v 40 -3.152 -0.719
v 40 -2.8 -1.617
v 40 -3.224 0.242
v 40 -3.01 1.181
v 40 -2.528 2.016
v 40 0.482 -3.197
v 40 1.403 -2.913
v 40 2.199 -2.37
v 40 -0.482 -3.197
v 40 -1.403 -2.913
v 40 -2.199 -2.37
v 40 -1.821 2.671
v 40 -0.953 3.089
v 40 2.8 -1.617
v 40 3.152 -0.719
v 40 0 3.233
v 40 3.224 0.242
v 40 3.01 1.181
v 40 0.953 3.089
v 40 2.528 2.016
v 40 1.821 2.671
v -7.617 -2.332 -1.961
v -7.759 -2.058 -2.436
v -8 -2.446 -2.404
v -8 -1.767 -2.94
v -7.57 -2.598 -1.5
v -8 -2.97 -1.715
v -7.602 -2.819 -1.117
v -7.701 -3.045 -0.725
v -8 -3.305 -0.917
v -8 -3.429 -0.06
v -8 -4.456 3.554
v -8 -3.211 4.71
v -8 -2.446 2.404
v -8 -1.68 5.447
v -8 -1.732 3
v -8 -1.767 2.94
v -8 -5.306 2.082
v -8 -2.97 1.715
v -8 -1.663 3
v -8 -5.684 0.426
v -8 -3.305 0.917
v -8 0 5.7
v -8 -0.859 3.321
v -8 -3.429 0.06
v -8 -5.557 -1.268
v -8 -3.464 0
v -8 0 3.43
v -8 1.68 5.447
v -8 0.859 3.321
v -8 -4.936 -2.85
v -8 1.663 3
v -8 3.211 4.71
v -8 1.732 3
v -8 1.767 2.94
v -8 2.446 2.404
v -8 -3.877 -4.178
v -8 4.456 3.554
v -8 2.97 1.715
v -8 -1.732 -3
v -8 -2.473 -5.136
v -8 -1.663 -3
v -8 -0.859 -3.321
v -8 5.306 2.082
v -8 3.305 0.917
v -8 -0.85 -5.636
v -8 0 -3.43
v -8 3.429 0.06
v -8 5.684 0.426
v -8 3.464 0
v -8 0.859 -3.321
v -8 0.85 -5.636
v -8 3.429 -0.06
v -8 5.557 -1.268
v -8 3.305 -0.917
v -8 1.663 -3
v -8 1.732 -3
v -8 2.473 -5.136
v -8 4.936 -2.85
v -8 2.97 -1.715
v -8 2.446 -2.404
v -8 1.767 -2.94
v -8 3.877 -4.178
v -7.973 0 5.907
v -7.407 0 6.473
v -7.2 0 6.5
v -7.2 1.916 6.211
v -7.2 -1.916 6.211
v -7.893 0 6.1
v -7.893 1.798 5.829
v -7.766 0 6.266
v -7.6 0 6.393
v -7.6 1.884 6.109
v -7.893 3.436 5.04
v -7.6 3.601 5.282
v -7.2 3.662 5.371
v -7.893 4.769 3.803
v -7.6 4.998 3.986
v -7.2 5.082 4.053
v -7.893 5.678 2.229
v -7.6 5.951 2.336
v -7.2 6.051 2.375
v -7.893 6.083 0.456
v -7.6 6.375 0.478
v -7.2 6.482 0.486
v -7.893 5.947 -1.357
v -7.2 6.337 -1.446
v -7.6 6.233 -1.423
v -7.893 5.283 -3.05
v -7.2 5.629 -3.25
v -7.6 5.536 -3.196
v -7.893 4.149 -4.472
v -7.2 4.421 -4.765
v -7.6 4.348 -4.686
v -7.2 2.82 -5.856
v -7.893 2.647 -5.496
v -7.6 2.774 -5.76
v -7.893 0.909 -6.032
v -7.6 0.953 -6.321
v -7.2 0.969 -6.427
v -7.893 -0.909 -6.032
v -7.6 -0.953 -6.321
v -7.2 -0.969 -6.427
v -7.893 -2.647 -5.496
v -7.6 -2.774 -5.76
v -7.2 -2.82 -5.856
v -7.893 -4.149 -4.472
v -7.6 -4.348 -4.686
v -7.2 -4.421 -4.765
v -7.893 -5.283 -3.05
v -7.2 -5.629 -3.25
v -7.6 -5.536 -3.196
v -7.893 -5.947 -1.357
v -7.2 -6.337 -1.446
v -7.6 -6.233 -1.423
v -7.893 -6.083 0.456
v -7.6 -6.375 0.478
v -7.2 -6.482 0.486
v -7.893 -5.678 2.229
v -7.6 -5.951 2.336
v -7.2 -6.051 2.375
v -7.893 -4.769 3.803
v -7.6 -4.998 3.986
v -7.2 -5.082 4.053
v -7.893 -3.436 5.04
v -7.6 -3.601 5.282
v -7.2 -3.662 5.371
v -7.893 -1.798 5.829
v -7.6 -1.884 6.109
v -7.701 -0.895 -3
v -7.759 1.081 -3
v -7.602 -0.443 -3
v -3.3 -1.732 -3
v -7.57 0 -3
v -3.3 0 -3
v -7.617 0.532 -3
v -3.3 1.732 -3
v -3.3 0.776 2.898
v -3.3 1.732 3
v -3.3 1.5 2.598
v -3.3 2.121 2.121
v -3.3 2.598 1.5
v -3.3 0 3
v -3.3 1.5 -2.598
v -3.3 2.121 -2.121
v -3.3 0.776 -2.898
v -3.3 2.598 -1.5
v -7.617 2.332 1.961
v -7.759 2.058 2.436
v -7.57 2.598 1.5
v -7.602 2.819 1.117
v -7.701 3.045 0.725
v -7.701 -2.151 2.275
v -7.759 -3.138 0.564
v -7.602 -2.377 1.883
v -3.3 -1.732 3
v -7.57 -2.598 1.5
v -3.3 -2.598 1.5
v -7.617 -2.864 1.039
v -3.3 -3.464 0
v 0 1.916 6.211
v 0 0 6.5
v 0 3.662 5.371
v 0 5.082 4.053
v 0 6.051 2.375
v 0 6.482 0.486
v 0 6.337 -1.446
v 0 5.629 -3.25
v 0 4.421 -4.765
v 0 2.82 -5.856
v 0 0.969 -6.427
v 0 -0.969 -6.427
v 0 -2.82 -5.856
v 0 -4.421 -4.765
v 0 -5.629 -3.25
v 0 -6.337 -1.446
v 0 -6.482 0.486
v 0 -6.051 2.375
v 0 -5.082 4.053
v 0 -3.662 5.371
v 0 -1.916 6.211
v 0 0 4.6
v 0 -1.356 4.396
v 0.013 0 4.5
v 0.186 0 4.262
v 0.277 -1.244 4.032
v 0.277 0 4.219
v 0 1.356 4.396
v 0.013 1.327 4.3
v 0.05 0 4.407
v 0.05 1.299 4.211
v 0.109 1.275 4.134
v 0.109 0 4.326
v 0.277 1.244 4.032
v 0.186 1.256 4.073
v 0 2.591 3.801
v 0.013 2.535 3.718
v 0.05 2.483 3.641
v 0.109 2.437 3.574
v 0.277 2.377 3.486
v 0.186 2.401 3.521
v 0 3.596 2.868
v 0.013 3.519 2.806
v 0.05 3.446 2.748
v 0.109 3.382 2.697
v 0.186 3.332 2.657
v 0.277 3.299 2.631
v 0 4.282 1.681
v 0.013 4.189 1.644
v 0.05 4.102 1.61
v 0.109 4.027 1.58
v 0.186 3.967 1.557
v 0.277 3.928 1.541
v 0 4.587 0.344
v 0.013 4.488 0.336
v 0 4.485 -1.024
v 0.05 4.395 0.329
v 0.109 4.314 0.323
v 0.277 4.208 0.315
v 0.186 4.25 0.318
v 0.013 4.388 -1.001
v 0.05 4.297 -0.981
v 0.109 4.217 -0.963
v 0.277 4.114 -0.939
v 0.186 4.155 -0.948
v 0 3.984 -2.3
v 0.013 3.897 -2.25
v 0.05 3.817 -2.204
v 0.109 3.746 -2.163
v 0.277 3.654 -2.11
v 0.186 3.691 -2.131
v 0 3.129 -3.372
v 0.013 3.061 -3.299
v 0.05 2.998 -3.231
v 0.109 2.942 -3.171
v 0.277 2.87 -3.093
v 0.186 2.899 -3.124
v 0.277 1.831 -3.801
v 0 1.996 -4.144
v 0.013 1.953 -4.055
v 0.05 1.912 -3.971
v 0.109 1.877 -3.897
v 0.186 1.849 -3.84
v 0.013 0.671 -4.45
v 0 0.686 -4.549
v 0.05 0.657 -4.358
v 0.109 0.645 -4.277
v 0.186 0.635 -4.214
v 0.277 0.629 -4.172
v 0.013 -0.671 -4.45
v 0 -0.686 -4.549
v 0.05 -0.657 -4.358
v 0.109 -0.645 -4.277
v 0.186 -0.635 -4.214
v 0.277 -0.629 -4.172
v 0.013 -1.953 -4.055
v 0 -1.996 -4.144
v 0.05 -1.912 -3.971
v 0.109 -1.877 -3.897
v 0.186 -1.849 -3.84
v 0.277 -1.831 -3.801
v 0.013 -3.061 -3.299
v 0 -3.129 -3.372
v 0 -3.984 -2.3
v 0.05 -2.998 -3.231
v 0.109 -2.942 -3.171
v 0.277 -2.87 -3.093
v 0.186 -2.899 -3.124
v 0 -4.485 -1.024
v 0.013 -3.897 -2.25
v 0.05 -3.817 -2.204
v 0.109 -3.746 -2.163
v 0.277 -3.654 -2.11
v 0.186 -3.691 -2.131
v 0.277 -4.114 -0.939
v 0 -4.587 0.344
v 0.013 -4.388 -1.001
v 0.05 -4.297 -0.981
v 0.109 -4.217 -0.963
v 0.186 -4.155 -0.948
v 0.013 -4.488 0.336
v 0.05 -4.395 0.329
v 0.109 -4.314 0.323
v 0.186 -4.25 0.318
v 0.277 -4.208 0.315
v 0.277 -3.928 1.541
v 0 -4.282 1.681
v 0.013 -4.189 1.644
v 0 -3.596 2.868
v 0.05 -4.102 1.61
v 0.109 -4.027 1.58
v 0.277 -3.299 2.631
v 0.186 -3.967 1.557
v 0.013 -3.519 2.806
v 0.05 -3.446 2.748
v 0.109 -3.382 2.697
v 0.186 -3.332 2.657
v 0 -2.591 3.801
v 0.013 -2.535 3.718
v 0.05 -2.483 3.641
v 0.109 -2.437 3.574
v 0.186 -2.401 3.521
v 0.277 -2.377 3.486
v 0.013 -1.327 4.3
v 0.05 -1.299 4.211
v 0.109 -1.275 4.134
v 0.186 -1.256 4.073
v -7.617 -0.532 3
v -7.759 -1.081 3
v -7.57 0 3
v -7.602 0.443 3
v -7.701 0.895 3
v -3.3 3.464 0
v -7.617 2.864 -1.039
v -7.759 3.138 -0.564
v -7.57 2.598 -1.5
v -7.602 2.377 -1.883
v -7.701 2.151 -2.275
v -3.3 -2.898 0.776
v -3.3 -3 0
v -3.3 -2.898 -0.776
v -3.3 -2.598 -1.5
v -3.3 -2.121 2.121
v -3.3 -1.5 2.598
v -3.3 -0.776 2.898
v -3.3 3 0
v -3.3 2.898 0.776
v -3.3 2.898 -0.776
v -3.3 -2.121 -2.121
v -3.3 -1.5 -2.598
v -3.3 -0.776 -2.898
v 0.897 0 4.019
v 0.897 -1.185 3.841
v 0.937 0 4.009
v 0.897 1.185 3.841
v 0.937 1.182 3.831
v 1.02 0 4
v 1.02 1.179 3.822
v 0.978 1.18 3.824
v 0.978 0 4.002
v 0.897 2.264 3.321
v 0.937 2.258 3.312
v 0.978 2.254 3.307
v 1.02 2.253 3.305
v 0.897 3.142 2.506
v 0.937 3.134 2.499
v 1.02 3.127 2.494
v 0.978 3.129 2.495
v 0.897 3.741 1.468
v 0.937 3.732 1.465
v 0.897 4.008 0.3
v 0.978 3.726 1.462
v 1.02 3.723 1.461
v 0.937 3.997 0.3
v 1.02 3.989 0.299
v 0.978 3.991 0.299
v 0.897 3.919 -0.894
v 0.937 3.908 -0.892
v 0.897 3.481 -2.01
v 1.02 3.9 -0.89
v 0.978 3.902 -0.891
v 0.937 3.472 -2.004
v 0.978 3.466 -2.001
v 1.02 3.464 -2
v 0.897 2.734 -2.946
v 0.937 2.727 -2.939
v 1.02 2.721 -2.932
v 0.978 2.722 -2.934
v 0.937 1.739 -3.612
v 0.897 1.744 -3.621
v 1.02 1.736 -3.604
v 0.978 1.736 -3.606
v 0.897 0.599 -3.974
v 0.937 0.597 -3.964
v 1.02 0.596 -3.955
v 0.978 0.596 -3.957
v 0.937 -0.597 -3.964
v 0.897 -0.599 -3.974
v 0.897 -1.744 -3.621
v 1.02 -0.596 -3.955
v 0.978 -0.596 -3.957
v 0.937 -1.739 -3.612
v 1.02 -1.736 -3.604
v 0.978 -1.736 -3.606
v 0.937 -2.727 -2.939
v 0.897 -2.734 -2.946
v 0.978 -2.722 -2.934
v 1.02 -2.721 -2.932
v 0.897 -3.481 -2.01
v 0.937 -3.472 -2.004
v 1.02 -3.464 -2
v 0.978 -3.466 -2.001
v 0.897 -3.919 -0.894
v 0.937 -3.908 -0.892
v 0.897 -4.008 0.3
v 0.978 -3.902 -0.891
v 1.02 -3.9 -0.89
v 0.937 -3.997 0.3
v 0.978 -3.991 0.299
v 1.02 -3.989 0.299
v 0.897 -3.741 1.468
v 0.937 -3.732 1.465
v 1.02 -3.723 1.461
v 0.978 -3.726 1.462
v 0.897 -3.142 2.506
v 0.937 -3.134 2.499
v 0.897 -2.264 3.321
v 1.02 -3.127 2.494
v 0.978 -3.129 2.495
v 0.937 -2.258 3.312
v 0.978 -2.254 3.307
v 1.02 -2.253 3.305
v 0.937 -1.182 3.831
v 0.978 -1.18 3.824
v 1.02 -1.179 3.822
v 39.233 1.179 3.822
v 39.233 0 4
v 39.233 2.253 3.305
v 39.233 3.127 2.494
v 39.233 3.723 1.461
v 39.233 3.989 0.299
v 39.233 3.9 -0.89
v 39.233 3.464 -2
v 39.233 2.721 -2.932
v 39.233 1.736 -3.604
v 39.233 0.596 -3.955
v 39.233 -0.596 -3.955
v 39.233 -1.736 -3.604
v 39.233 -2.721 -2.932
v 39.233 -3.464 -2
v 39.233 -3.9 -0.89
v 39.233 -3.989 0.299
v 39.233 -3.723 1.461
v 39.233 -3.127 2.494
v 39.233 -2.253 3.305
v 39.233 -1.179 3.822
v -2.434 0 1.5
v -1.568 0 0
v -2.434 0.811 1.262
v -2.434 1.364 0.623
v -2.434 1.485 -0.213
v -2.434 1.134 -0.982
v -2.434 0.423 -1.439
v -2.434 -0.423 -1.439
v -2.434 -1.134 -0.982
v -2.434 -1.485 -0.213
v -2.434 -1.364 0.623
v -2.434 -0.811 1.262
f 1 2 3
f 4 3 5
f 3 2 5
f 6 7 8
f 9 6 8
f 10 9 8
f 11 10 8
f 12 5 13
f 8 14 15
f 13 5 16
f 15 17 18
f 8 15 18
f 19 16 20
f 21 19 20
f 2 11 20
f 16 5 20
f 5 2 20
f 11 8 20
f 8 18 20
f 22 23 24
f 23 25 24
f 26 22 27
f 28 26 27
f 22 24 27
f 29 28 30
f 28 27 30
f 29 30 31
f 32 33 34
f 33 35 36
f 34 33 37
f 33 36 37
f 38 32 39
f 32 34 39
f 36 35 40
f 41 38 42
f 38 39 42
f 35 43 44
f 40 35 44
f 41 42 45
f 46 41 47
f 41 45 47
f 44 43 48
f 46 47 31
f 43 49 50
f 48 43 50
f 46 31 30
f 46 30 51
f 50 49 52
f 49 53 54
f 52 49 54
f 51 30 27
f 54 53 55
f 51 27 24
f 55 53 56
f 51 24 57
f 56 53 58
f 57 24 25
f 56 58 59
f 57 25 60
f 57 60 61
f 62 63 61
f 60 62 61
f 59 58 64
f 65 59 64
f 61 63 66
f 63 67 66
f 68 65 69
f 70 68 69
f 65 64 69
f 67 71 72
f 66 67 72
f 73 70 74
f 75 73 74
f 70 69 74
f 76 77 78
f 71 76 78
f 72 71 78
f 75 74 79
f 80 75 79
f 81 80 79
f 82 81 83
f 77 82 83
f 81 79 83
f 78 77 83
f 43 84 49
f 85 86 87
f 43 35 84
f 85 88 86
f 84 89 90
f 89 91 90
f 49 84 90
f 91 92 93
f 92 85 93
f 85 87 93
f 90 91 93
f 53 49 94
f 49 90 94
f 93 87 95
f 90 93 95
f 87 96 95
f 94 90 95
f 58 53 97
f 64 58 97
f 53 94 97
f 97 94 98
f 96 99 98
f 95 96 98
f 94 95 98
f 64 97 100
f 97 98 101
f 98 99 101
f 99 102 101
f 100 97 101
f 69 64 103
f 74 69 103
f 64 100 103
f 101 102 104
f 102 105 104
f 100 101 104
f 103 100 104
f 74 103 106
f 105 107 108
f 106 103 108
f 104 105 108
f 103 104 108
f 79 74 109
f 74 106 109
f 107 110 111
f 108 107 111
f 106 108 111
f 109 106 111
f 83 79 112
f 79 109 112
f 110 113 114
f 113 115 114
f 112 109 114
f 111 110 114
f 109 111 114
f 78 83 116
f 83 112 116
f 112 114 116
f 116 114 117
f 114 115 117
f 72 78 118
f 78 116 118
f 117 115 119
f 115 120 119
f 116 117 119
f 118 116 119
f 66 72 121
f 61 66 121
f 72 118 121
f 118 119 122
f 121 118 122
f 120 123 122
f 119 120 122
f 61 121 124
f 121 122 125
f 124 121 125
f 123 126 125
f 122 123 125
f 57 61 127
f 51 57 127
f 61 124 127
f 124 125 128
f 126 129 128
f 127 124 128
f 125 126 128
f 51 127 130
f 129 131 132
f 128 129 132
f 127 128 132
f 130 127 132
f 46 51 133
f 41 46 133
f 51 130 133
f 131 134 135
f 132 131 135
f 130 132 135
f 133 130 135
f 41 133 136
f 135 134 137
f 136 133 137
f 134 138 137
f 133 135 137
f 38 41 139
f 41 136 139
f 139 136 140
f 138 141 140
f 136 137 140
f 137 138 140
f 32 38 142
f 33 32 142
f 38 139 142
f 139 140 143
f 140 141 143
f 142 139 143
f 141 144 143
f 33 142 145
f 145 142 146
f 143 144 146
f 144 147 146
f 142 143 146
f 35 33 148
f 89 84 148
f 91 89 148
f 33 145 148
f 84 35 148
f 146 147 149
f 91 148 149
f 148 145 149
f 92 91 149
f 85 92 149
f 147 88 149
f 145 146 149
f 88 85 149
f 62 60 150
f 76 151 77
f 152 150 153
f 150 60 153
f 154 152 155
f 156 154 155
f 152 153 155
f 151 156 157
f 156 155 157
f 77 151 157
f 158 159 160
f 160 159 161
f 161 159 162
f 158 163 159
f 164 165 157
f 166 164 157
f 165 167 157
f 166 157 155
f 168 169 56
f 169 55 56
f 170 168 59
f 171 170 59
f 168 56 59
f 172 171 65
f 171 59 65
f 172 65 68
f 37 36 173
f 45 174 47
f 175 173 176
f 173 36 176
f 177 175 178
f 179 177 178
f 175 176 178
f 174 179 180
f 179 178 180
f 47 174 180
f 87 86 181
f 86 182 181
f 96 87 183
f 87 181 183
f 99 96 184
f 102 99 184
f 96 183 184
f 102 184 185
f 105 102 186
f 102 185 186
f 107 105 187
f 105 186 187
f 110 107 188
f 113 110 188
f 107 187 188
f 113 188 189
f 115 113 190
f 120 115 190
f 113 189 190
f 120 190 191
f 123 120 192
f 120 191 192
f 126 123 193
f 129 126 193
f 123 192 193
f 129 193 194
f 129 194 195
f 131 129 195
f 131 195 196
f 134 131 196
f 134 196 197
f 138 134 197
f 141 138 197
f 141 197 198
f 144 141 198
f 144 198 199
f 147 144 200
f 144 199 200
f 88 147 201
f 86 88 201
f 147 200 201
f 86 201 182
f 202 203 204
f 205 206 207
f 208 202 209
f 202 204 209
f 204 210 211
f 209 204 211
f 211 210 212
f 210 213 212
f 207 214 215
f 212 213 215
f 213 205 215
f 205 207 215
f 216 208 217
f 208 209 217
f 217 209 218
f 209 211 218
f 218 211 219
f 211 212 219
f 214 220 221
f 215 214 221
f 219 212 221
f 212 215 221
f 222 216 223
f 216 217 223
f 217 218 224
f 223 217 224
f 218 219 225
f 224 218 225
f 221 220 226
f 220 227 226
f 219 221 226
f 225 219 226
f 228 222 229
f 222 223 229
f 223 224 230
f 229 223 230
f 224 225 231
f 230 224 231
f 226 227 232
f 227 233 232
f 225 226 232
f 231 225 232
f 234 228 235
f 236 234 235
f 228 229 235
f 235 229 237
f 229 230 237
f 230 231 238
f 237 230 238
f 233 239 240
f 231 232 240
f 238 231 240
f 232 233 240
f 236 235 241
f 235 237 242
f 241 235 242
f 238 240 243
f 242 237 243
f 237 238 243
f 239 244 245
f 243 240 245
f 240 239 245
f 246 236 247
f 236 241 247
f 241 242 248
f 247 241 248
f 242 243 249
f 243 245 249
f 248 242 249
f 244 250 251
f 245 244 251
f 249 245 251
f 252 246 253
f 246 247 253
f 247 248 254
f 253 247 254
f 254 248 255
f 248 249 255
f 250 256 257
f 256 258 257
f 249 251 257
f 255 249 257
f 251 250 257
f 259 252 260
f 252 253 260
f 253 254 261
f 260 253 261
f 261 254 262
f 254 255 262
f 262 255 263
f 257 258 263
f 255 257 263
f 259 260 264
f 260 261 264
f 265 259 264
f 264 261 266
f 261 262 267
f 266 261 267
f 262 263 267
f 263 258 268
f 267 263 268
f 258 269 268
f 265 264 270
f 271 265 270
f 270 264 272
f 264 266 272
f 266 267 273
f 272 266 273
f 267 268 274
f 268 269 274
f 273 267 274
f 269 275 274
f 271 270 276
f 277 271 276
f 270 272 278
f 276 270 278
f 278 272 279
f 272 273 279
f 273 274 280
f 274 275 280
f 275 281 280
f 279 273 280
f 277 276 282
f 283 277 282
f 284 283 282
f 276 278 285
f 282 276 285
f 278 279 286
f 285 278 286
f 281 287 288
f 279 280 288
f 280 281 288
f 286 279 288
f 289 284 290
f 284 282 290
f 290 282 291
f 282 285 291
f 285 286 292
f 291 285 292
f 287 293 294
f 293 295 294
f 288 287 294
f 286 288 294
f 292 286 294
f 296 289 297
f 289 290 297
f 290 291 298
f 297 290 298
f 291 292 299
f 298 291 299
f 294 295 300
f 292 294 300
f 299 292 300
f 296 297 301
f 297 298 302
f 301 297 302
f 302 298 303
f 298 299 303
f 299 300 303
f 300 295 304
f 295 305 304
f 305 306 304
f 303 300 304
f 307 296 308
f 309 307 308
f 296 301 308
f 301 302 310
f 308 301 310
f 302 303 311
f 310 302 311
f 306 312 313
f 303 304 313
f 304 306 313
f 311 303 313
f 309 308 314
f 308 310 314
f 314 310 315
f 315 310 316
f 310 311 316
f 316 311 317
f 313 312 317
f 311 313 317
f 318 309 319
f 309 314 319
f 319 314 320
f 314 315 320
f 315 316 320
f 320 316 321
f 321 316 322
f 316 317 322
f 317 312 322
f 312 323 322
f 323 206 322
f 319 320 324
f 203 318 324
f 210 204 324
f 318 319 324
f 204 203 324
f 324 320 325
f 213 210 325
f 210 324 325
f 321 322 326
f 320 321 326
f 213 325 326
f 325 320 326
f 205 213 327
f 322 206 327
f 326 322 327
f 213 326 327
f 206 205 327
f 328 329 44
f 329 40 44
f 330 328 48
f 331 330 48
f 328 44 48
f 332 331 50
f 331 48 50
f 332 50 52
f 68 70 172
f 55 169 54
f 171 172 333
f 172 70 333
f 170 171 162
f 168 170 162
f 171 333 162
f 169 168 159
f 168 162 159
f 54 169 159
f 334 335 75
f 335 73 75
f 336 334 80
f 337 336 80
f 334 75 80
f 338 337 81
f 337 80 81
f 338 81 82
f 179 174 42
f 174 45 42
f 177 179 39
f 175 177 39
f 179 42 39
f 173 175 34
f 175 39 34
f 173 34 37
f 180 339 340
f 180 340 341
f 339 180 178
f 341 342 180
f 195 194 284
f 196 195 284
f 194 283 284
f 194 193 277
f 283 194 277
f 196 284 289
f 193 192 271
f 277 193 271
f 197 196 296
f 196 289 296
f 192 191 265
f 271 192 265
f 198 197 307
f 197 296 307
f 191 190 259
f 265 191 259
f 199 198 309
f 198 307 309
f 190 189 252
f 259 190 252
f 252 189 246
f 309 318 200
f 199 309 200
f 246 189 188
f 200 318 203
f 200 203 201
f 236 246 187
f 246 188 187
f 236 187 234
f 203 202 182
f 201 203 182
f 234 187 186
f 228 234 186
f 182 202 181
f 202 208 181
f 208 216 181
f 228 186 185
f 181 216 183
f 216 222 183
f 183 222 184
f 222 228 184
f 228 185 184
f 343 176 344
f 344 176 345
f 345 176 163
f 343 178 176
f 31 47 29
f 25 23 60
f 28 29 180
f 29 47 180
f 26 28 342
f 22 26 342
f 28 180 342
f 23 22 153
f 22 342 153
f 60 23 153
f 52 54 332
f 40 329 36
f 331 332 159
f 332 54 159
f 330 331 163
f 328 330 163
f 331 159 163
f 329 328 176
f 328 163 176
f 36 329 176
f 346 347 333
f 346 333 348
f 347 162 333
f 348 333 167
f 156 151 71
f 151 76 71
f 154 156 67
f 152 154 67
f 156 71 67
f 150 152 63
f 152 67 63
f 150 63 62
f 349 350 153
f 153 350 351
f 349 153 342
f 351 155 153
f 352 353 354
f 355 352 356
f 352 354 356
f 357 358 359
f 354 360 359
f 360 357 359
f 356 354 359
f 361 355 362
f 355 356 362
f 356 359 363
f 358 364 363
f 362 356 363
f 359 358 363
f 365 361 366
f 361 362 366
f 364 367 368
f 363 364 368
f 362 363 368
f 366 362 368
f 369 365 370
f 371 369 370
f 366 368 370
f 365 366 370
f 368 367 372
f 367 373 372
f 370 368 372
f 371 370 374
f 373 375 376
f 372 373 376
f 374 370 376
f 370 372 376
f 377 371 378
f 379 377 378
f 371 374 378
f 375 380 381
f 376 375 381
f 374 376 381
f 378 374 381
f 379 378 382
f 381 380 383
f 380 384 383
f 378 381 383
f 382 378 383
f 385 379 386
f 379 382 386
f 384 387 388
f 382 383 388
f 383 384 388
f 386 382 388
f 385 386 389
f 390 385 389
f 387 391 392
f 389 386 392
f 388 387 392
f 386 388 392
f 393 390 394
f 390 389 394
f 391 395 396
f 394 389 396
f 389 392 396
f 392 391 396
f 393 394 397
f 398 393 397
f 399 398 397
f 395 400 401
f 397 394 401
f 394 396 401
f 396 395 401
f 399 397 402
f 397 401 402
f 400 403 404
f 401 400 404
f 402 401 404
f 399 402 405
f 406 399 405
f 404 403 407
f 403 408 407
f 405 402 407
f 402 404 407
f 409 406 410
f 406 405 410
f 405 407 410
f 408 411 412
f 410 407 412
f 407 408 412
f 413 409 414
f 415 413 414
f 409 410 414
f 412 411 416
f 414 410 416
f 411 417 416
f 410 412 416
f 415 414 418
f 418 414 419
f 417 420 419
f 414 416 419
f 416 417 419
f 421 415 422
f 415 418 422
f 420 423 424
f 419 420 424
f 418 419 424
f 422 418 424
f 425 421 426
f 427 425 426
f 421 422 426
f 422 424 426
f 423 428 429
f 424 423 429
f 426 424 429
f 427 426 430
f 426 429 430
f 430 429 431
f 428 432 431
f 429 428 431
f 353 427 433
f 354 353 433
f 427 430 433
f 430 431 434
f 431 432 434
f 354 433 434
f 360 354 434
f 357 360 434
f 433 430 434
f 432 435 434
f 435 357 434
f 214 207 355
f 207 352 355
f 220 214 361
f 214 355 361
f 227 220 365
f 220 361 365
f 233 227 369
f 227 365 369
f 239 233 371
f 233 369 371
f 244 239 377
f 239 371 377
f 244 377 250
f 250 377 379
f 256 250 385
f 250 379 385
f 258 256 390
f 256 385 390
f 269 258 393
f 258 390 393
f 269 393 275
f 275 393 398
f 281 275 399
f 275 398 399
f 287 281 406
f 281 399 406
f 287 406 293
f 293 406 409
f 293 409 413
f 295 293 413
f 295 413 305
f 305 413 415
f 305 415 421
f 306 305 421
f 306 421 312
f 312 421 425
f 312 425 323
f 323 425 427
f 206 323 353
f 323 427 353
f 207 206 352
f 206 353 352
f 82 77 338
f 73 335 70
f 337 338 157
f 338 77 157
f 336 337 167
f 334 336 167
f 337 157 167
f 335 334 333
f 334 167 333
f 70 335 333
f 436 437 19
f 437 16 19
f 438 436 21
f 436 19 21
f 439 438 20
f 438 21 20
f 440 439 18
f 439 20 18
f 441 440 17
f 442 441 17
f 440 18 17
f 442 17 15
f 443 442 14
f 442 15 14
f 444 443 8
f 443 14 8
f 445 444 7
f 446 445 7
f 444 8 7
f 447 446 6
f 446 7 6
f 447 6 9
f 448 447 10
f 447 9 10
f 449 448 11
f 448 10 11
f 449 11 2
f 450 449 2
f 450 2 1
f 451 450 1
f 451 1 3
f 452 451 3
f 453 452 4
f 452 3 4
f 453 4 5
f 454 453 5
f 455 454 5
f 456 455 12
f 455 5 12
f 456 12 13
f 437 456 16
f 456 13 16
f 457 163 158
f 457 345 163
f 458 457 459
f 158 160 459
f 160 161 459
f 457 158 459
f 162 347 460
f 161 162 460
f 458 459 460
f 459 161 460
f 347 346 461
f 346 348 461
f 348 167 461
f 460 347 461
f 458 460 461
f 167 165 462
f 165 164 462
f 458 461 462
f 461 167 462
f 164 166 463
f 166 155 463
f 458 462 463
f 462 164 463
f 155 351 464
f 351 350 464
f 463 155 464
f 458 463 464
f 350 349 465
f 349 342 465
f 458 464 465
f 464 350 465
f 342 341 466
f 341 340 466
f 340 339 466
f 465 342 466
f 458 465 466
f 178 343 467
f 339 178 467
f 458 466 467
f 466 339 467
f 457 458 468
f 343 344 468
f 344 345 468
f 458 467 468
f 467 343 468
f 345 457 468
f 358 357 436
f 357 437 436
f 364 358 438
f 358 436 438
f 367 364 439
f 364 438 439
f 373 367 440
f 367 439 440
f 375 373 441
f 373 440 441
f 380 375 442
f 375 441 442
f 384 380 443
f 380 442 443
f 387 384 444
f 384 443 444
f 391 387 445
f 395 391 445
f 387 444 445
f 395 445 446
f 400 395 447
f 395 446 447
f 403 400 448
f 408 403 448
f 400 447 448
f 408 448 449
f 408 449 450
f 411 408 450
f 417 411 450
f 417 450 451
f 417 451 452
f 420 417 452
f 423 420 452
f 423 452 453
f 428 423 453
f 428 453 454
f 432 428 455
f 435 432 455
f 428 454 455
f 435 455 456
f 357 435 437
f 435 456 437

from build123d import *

# Parameters (mm, degrees)
ENL_V_MAT_EXTRU_1_DEPTH = 8
ESQUISSE3_R             = 4.875
BOSS_EXTRU_1_DEPTH      = 4.161898962


with BuildPart() as part:
    # Esquisse1 → Révolution1 (revolve)
    with BuildSketch(Plane(origin=(0, 0, 0), x_dir=(1, 0, 0), z_dir=(0, 1, 0)), mode=Mode.PRIVATE) as r_volution1_sk:
        with BuildLine():
            Line((-1.567949192, 0), (-3.3, 3))
            Line((-3.3, 3), (-7.57, 3))
            Line((-7.57, 3), (-8, 3.43))
            Line((-8, 3.43), (-8, 5.7))
            ThreePointArc((-8, 5.7), (-7.765685425, 6.265685425), (-7.2, 6.5))
            Line((-7.2, 6.5), (0, 6.5))
            Line((0, 6.5), (0, 4.6))
            ThreePointArc((0, 4.6), (0.076642269, 4.36454347), (0.277198888, 4.219316553))
            Line((0.277198888, 4.219316553), (0.897198888, 4.019316553))
            ThreePointArc((0.897198888, 4.019316553), (0.957844465, 4.004858646), (1.02, 4))
            Line((1.02, 4), (39.233, 4))
            Line((39.233, 4), (40, 3.233))
            Line((40, 3.233), (40, 0))
            Line((40, 0), (-1.567949192, 0))
        make_face()
    revolve(r_volution1_sk.sketch.rotate(Axis((43, 0, 0), (-1, 0, 0)), 180), axis=Axis((43, 0, 0), (-1, 0, 0)))

    # Esquisse2 → Enlèv. mat.-Extru.1 (cut)
    with BuildSketch(Plane(origin=(-3.3, 0, 0), x_dir=(0, 0, -1), z_dir=(1, 0, 0))):
        Polygon((-3, 1.732050808), (-3, -1.732050808), (0, -3.464101615), (3, -1.732050808), (3, 1.732050808), (0, 3.464101615), align=None)
    extrude(amount=-ENL_V_MAT_EXTRU_1_DEPTH, mode=Mode.SUBTRACT)


with BuildPart() as body_2:
    # Esquisse3 → Boss.-Extru.1 (new body)
    with BuildSketch(Plane(origin=(0, 0, 0), x_dir=(0, 0, -1), z_dir=(1, 0, 0))):
        Circle(ESQUISSE3_R)
    extrude(amount=-BOSS_EXTRU_1_DEPTH)

    # SupprimerFace1: 1 face struck out; the rest of the skin is kept as a surface, the solid goes
    supprimerface1_1_drop = [body_2.part.faces().sort_by_distance(Vector(p))[0] for p in ((-4.161898962, 0, 0),)]
    supprimerface1_1 = Shell(body_2.part.faces() - supprimerface1_1_drop)


solid = part.part
